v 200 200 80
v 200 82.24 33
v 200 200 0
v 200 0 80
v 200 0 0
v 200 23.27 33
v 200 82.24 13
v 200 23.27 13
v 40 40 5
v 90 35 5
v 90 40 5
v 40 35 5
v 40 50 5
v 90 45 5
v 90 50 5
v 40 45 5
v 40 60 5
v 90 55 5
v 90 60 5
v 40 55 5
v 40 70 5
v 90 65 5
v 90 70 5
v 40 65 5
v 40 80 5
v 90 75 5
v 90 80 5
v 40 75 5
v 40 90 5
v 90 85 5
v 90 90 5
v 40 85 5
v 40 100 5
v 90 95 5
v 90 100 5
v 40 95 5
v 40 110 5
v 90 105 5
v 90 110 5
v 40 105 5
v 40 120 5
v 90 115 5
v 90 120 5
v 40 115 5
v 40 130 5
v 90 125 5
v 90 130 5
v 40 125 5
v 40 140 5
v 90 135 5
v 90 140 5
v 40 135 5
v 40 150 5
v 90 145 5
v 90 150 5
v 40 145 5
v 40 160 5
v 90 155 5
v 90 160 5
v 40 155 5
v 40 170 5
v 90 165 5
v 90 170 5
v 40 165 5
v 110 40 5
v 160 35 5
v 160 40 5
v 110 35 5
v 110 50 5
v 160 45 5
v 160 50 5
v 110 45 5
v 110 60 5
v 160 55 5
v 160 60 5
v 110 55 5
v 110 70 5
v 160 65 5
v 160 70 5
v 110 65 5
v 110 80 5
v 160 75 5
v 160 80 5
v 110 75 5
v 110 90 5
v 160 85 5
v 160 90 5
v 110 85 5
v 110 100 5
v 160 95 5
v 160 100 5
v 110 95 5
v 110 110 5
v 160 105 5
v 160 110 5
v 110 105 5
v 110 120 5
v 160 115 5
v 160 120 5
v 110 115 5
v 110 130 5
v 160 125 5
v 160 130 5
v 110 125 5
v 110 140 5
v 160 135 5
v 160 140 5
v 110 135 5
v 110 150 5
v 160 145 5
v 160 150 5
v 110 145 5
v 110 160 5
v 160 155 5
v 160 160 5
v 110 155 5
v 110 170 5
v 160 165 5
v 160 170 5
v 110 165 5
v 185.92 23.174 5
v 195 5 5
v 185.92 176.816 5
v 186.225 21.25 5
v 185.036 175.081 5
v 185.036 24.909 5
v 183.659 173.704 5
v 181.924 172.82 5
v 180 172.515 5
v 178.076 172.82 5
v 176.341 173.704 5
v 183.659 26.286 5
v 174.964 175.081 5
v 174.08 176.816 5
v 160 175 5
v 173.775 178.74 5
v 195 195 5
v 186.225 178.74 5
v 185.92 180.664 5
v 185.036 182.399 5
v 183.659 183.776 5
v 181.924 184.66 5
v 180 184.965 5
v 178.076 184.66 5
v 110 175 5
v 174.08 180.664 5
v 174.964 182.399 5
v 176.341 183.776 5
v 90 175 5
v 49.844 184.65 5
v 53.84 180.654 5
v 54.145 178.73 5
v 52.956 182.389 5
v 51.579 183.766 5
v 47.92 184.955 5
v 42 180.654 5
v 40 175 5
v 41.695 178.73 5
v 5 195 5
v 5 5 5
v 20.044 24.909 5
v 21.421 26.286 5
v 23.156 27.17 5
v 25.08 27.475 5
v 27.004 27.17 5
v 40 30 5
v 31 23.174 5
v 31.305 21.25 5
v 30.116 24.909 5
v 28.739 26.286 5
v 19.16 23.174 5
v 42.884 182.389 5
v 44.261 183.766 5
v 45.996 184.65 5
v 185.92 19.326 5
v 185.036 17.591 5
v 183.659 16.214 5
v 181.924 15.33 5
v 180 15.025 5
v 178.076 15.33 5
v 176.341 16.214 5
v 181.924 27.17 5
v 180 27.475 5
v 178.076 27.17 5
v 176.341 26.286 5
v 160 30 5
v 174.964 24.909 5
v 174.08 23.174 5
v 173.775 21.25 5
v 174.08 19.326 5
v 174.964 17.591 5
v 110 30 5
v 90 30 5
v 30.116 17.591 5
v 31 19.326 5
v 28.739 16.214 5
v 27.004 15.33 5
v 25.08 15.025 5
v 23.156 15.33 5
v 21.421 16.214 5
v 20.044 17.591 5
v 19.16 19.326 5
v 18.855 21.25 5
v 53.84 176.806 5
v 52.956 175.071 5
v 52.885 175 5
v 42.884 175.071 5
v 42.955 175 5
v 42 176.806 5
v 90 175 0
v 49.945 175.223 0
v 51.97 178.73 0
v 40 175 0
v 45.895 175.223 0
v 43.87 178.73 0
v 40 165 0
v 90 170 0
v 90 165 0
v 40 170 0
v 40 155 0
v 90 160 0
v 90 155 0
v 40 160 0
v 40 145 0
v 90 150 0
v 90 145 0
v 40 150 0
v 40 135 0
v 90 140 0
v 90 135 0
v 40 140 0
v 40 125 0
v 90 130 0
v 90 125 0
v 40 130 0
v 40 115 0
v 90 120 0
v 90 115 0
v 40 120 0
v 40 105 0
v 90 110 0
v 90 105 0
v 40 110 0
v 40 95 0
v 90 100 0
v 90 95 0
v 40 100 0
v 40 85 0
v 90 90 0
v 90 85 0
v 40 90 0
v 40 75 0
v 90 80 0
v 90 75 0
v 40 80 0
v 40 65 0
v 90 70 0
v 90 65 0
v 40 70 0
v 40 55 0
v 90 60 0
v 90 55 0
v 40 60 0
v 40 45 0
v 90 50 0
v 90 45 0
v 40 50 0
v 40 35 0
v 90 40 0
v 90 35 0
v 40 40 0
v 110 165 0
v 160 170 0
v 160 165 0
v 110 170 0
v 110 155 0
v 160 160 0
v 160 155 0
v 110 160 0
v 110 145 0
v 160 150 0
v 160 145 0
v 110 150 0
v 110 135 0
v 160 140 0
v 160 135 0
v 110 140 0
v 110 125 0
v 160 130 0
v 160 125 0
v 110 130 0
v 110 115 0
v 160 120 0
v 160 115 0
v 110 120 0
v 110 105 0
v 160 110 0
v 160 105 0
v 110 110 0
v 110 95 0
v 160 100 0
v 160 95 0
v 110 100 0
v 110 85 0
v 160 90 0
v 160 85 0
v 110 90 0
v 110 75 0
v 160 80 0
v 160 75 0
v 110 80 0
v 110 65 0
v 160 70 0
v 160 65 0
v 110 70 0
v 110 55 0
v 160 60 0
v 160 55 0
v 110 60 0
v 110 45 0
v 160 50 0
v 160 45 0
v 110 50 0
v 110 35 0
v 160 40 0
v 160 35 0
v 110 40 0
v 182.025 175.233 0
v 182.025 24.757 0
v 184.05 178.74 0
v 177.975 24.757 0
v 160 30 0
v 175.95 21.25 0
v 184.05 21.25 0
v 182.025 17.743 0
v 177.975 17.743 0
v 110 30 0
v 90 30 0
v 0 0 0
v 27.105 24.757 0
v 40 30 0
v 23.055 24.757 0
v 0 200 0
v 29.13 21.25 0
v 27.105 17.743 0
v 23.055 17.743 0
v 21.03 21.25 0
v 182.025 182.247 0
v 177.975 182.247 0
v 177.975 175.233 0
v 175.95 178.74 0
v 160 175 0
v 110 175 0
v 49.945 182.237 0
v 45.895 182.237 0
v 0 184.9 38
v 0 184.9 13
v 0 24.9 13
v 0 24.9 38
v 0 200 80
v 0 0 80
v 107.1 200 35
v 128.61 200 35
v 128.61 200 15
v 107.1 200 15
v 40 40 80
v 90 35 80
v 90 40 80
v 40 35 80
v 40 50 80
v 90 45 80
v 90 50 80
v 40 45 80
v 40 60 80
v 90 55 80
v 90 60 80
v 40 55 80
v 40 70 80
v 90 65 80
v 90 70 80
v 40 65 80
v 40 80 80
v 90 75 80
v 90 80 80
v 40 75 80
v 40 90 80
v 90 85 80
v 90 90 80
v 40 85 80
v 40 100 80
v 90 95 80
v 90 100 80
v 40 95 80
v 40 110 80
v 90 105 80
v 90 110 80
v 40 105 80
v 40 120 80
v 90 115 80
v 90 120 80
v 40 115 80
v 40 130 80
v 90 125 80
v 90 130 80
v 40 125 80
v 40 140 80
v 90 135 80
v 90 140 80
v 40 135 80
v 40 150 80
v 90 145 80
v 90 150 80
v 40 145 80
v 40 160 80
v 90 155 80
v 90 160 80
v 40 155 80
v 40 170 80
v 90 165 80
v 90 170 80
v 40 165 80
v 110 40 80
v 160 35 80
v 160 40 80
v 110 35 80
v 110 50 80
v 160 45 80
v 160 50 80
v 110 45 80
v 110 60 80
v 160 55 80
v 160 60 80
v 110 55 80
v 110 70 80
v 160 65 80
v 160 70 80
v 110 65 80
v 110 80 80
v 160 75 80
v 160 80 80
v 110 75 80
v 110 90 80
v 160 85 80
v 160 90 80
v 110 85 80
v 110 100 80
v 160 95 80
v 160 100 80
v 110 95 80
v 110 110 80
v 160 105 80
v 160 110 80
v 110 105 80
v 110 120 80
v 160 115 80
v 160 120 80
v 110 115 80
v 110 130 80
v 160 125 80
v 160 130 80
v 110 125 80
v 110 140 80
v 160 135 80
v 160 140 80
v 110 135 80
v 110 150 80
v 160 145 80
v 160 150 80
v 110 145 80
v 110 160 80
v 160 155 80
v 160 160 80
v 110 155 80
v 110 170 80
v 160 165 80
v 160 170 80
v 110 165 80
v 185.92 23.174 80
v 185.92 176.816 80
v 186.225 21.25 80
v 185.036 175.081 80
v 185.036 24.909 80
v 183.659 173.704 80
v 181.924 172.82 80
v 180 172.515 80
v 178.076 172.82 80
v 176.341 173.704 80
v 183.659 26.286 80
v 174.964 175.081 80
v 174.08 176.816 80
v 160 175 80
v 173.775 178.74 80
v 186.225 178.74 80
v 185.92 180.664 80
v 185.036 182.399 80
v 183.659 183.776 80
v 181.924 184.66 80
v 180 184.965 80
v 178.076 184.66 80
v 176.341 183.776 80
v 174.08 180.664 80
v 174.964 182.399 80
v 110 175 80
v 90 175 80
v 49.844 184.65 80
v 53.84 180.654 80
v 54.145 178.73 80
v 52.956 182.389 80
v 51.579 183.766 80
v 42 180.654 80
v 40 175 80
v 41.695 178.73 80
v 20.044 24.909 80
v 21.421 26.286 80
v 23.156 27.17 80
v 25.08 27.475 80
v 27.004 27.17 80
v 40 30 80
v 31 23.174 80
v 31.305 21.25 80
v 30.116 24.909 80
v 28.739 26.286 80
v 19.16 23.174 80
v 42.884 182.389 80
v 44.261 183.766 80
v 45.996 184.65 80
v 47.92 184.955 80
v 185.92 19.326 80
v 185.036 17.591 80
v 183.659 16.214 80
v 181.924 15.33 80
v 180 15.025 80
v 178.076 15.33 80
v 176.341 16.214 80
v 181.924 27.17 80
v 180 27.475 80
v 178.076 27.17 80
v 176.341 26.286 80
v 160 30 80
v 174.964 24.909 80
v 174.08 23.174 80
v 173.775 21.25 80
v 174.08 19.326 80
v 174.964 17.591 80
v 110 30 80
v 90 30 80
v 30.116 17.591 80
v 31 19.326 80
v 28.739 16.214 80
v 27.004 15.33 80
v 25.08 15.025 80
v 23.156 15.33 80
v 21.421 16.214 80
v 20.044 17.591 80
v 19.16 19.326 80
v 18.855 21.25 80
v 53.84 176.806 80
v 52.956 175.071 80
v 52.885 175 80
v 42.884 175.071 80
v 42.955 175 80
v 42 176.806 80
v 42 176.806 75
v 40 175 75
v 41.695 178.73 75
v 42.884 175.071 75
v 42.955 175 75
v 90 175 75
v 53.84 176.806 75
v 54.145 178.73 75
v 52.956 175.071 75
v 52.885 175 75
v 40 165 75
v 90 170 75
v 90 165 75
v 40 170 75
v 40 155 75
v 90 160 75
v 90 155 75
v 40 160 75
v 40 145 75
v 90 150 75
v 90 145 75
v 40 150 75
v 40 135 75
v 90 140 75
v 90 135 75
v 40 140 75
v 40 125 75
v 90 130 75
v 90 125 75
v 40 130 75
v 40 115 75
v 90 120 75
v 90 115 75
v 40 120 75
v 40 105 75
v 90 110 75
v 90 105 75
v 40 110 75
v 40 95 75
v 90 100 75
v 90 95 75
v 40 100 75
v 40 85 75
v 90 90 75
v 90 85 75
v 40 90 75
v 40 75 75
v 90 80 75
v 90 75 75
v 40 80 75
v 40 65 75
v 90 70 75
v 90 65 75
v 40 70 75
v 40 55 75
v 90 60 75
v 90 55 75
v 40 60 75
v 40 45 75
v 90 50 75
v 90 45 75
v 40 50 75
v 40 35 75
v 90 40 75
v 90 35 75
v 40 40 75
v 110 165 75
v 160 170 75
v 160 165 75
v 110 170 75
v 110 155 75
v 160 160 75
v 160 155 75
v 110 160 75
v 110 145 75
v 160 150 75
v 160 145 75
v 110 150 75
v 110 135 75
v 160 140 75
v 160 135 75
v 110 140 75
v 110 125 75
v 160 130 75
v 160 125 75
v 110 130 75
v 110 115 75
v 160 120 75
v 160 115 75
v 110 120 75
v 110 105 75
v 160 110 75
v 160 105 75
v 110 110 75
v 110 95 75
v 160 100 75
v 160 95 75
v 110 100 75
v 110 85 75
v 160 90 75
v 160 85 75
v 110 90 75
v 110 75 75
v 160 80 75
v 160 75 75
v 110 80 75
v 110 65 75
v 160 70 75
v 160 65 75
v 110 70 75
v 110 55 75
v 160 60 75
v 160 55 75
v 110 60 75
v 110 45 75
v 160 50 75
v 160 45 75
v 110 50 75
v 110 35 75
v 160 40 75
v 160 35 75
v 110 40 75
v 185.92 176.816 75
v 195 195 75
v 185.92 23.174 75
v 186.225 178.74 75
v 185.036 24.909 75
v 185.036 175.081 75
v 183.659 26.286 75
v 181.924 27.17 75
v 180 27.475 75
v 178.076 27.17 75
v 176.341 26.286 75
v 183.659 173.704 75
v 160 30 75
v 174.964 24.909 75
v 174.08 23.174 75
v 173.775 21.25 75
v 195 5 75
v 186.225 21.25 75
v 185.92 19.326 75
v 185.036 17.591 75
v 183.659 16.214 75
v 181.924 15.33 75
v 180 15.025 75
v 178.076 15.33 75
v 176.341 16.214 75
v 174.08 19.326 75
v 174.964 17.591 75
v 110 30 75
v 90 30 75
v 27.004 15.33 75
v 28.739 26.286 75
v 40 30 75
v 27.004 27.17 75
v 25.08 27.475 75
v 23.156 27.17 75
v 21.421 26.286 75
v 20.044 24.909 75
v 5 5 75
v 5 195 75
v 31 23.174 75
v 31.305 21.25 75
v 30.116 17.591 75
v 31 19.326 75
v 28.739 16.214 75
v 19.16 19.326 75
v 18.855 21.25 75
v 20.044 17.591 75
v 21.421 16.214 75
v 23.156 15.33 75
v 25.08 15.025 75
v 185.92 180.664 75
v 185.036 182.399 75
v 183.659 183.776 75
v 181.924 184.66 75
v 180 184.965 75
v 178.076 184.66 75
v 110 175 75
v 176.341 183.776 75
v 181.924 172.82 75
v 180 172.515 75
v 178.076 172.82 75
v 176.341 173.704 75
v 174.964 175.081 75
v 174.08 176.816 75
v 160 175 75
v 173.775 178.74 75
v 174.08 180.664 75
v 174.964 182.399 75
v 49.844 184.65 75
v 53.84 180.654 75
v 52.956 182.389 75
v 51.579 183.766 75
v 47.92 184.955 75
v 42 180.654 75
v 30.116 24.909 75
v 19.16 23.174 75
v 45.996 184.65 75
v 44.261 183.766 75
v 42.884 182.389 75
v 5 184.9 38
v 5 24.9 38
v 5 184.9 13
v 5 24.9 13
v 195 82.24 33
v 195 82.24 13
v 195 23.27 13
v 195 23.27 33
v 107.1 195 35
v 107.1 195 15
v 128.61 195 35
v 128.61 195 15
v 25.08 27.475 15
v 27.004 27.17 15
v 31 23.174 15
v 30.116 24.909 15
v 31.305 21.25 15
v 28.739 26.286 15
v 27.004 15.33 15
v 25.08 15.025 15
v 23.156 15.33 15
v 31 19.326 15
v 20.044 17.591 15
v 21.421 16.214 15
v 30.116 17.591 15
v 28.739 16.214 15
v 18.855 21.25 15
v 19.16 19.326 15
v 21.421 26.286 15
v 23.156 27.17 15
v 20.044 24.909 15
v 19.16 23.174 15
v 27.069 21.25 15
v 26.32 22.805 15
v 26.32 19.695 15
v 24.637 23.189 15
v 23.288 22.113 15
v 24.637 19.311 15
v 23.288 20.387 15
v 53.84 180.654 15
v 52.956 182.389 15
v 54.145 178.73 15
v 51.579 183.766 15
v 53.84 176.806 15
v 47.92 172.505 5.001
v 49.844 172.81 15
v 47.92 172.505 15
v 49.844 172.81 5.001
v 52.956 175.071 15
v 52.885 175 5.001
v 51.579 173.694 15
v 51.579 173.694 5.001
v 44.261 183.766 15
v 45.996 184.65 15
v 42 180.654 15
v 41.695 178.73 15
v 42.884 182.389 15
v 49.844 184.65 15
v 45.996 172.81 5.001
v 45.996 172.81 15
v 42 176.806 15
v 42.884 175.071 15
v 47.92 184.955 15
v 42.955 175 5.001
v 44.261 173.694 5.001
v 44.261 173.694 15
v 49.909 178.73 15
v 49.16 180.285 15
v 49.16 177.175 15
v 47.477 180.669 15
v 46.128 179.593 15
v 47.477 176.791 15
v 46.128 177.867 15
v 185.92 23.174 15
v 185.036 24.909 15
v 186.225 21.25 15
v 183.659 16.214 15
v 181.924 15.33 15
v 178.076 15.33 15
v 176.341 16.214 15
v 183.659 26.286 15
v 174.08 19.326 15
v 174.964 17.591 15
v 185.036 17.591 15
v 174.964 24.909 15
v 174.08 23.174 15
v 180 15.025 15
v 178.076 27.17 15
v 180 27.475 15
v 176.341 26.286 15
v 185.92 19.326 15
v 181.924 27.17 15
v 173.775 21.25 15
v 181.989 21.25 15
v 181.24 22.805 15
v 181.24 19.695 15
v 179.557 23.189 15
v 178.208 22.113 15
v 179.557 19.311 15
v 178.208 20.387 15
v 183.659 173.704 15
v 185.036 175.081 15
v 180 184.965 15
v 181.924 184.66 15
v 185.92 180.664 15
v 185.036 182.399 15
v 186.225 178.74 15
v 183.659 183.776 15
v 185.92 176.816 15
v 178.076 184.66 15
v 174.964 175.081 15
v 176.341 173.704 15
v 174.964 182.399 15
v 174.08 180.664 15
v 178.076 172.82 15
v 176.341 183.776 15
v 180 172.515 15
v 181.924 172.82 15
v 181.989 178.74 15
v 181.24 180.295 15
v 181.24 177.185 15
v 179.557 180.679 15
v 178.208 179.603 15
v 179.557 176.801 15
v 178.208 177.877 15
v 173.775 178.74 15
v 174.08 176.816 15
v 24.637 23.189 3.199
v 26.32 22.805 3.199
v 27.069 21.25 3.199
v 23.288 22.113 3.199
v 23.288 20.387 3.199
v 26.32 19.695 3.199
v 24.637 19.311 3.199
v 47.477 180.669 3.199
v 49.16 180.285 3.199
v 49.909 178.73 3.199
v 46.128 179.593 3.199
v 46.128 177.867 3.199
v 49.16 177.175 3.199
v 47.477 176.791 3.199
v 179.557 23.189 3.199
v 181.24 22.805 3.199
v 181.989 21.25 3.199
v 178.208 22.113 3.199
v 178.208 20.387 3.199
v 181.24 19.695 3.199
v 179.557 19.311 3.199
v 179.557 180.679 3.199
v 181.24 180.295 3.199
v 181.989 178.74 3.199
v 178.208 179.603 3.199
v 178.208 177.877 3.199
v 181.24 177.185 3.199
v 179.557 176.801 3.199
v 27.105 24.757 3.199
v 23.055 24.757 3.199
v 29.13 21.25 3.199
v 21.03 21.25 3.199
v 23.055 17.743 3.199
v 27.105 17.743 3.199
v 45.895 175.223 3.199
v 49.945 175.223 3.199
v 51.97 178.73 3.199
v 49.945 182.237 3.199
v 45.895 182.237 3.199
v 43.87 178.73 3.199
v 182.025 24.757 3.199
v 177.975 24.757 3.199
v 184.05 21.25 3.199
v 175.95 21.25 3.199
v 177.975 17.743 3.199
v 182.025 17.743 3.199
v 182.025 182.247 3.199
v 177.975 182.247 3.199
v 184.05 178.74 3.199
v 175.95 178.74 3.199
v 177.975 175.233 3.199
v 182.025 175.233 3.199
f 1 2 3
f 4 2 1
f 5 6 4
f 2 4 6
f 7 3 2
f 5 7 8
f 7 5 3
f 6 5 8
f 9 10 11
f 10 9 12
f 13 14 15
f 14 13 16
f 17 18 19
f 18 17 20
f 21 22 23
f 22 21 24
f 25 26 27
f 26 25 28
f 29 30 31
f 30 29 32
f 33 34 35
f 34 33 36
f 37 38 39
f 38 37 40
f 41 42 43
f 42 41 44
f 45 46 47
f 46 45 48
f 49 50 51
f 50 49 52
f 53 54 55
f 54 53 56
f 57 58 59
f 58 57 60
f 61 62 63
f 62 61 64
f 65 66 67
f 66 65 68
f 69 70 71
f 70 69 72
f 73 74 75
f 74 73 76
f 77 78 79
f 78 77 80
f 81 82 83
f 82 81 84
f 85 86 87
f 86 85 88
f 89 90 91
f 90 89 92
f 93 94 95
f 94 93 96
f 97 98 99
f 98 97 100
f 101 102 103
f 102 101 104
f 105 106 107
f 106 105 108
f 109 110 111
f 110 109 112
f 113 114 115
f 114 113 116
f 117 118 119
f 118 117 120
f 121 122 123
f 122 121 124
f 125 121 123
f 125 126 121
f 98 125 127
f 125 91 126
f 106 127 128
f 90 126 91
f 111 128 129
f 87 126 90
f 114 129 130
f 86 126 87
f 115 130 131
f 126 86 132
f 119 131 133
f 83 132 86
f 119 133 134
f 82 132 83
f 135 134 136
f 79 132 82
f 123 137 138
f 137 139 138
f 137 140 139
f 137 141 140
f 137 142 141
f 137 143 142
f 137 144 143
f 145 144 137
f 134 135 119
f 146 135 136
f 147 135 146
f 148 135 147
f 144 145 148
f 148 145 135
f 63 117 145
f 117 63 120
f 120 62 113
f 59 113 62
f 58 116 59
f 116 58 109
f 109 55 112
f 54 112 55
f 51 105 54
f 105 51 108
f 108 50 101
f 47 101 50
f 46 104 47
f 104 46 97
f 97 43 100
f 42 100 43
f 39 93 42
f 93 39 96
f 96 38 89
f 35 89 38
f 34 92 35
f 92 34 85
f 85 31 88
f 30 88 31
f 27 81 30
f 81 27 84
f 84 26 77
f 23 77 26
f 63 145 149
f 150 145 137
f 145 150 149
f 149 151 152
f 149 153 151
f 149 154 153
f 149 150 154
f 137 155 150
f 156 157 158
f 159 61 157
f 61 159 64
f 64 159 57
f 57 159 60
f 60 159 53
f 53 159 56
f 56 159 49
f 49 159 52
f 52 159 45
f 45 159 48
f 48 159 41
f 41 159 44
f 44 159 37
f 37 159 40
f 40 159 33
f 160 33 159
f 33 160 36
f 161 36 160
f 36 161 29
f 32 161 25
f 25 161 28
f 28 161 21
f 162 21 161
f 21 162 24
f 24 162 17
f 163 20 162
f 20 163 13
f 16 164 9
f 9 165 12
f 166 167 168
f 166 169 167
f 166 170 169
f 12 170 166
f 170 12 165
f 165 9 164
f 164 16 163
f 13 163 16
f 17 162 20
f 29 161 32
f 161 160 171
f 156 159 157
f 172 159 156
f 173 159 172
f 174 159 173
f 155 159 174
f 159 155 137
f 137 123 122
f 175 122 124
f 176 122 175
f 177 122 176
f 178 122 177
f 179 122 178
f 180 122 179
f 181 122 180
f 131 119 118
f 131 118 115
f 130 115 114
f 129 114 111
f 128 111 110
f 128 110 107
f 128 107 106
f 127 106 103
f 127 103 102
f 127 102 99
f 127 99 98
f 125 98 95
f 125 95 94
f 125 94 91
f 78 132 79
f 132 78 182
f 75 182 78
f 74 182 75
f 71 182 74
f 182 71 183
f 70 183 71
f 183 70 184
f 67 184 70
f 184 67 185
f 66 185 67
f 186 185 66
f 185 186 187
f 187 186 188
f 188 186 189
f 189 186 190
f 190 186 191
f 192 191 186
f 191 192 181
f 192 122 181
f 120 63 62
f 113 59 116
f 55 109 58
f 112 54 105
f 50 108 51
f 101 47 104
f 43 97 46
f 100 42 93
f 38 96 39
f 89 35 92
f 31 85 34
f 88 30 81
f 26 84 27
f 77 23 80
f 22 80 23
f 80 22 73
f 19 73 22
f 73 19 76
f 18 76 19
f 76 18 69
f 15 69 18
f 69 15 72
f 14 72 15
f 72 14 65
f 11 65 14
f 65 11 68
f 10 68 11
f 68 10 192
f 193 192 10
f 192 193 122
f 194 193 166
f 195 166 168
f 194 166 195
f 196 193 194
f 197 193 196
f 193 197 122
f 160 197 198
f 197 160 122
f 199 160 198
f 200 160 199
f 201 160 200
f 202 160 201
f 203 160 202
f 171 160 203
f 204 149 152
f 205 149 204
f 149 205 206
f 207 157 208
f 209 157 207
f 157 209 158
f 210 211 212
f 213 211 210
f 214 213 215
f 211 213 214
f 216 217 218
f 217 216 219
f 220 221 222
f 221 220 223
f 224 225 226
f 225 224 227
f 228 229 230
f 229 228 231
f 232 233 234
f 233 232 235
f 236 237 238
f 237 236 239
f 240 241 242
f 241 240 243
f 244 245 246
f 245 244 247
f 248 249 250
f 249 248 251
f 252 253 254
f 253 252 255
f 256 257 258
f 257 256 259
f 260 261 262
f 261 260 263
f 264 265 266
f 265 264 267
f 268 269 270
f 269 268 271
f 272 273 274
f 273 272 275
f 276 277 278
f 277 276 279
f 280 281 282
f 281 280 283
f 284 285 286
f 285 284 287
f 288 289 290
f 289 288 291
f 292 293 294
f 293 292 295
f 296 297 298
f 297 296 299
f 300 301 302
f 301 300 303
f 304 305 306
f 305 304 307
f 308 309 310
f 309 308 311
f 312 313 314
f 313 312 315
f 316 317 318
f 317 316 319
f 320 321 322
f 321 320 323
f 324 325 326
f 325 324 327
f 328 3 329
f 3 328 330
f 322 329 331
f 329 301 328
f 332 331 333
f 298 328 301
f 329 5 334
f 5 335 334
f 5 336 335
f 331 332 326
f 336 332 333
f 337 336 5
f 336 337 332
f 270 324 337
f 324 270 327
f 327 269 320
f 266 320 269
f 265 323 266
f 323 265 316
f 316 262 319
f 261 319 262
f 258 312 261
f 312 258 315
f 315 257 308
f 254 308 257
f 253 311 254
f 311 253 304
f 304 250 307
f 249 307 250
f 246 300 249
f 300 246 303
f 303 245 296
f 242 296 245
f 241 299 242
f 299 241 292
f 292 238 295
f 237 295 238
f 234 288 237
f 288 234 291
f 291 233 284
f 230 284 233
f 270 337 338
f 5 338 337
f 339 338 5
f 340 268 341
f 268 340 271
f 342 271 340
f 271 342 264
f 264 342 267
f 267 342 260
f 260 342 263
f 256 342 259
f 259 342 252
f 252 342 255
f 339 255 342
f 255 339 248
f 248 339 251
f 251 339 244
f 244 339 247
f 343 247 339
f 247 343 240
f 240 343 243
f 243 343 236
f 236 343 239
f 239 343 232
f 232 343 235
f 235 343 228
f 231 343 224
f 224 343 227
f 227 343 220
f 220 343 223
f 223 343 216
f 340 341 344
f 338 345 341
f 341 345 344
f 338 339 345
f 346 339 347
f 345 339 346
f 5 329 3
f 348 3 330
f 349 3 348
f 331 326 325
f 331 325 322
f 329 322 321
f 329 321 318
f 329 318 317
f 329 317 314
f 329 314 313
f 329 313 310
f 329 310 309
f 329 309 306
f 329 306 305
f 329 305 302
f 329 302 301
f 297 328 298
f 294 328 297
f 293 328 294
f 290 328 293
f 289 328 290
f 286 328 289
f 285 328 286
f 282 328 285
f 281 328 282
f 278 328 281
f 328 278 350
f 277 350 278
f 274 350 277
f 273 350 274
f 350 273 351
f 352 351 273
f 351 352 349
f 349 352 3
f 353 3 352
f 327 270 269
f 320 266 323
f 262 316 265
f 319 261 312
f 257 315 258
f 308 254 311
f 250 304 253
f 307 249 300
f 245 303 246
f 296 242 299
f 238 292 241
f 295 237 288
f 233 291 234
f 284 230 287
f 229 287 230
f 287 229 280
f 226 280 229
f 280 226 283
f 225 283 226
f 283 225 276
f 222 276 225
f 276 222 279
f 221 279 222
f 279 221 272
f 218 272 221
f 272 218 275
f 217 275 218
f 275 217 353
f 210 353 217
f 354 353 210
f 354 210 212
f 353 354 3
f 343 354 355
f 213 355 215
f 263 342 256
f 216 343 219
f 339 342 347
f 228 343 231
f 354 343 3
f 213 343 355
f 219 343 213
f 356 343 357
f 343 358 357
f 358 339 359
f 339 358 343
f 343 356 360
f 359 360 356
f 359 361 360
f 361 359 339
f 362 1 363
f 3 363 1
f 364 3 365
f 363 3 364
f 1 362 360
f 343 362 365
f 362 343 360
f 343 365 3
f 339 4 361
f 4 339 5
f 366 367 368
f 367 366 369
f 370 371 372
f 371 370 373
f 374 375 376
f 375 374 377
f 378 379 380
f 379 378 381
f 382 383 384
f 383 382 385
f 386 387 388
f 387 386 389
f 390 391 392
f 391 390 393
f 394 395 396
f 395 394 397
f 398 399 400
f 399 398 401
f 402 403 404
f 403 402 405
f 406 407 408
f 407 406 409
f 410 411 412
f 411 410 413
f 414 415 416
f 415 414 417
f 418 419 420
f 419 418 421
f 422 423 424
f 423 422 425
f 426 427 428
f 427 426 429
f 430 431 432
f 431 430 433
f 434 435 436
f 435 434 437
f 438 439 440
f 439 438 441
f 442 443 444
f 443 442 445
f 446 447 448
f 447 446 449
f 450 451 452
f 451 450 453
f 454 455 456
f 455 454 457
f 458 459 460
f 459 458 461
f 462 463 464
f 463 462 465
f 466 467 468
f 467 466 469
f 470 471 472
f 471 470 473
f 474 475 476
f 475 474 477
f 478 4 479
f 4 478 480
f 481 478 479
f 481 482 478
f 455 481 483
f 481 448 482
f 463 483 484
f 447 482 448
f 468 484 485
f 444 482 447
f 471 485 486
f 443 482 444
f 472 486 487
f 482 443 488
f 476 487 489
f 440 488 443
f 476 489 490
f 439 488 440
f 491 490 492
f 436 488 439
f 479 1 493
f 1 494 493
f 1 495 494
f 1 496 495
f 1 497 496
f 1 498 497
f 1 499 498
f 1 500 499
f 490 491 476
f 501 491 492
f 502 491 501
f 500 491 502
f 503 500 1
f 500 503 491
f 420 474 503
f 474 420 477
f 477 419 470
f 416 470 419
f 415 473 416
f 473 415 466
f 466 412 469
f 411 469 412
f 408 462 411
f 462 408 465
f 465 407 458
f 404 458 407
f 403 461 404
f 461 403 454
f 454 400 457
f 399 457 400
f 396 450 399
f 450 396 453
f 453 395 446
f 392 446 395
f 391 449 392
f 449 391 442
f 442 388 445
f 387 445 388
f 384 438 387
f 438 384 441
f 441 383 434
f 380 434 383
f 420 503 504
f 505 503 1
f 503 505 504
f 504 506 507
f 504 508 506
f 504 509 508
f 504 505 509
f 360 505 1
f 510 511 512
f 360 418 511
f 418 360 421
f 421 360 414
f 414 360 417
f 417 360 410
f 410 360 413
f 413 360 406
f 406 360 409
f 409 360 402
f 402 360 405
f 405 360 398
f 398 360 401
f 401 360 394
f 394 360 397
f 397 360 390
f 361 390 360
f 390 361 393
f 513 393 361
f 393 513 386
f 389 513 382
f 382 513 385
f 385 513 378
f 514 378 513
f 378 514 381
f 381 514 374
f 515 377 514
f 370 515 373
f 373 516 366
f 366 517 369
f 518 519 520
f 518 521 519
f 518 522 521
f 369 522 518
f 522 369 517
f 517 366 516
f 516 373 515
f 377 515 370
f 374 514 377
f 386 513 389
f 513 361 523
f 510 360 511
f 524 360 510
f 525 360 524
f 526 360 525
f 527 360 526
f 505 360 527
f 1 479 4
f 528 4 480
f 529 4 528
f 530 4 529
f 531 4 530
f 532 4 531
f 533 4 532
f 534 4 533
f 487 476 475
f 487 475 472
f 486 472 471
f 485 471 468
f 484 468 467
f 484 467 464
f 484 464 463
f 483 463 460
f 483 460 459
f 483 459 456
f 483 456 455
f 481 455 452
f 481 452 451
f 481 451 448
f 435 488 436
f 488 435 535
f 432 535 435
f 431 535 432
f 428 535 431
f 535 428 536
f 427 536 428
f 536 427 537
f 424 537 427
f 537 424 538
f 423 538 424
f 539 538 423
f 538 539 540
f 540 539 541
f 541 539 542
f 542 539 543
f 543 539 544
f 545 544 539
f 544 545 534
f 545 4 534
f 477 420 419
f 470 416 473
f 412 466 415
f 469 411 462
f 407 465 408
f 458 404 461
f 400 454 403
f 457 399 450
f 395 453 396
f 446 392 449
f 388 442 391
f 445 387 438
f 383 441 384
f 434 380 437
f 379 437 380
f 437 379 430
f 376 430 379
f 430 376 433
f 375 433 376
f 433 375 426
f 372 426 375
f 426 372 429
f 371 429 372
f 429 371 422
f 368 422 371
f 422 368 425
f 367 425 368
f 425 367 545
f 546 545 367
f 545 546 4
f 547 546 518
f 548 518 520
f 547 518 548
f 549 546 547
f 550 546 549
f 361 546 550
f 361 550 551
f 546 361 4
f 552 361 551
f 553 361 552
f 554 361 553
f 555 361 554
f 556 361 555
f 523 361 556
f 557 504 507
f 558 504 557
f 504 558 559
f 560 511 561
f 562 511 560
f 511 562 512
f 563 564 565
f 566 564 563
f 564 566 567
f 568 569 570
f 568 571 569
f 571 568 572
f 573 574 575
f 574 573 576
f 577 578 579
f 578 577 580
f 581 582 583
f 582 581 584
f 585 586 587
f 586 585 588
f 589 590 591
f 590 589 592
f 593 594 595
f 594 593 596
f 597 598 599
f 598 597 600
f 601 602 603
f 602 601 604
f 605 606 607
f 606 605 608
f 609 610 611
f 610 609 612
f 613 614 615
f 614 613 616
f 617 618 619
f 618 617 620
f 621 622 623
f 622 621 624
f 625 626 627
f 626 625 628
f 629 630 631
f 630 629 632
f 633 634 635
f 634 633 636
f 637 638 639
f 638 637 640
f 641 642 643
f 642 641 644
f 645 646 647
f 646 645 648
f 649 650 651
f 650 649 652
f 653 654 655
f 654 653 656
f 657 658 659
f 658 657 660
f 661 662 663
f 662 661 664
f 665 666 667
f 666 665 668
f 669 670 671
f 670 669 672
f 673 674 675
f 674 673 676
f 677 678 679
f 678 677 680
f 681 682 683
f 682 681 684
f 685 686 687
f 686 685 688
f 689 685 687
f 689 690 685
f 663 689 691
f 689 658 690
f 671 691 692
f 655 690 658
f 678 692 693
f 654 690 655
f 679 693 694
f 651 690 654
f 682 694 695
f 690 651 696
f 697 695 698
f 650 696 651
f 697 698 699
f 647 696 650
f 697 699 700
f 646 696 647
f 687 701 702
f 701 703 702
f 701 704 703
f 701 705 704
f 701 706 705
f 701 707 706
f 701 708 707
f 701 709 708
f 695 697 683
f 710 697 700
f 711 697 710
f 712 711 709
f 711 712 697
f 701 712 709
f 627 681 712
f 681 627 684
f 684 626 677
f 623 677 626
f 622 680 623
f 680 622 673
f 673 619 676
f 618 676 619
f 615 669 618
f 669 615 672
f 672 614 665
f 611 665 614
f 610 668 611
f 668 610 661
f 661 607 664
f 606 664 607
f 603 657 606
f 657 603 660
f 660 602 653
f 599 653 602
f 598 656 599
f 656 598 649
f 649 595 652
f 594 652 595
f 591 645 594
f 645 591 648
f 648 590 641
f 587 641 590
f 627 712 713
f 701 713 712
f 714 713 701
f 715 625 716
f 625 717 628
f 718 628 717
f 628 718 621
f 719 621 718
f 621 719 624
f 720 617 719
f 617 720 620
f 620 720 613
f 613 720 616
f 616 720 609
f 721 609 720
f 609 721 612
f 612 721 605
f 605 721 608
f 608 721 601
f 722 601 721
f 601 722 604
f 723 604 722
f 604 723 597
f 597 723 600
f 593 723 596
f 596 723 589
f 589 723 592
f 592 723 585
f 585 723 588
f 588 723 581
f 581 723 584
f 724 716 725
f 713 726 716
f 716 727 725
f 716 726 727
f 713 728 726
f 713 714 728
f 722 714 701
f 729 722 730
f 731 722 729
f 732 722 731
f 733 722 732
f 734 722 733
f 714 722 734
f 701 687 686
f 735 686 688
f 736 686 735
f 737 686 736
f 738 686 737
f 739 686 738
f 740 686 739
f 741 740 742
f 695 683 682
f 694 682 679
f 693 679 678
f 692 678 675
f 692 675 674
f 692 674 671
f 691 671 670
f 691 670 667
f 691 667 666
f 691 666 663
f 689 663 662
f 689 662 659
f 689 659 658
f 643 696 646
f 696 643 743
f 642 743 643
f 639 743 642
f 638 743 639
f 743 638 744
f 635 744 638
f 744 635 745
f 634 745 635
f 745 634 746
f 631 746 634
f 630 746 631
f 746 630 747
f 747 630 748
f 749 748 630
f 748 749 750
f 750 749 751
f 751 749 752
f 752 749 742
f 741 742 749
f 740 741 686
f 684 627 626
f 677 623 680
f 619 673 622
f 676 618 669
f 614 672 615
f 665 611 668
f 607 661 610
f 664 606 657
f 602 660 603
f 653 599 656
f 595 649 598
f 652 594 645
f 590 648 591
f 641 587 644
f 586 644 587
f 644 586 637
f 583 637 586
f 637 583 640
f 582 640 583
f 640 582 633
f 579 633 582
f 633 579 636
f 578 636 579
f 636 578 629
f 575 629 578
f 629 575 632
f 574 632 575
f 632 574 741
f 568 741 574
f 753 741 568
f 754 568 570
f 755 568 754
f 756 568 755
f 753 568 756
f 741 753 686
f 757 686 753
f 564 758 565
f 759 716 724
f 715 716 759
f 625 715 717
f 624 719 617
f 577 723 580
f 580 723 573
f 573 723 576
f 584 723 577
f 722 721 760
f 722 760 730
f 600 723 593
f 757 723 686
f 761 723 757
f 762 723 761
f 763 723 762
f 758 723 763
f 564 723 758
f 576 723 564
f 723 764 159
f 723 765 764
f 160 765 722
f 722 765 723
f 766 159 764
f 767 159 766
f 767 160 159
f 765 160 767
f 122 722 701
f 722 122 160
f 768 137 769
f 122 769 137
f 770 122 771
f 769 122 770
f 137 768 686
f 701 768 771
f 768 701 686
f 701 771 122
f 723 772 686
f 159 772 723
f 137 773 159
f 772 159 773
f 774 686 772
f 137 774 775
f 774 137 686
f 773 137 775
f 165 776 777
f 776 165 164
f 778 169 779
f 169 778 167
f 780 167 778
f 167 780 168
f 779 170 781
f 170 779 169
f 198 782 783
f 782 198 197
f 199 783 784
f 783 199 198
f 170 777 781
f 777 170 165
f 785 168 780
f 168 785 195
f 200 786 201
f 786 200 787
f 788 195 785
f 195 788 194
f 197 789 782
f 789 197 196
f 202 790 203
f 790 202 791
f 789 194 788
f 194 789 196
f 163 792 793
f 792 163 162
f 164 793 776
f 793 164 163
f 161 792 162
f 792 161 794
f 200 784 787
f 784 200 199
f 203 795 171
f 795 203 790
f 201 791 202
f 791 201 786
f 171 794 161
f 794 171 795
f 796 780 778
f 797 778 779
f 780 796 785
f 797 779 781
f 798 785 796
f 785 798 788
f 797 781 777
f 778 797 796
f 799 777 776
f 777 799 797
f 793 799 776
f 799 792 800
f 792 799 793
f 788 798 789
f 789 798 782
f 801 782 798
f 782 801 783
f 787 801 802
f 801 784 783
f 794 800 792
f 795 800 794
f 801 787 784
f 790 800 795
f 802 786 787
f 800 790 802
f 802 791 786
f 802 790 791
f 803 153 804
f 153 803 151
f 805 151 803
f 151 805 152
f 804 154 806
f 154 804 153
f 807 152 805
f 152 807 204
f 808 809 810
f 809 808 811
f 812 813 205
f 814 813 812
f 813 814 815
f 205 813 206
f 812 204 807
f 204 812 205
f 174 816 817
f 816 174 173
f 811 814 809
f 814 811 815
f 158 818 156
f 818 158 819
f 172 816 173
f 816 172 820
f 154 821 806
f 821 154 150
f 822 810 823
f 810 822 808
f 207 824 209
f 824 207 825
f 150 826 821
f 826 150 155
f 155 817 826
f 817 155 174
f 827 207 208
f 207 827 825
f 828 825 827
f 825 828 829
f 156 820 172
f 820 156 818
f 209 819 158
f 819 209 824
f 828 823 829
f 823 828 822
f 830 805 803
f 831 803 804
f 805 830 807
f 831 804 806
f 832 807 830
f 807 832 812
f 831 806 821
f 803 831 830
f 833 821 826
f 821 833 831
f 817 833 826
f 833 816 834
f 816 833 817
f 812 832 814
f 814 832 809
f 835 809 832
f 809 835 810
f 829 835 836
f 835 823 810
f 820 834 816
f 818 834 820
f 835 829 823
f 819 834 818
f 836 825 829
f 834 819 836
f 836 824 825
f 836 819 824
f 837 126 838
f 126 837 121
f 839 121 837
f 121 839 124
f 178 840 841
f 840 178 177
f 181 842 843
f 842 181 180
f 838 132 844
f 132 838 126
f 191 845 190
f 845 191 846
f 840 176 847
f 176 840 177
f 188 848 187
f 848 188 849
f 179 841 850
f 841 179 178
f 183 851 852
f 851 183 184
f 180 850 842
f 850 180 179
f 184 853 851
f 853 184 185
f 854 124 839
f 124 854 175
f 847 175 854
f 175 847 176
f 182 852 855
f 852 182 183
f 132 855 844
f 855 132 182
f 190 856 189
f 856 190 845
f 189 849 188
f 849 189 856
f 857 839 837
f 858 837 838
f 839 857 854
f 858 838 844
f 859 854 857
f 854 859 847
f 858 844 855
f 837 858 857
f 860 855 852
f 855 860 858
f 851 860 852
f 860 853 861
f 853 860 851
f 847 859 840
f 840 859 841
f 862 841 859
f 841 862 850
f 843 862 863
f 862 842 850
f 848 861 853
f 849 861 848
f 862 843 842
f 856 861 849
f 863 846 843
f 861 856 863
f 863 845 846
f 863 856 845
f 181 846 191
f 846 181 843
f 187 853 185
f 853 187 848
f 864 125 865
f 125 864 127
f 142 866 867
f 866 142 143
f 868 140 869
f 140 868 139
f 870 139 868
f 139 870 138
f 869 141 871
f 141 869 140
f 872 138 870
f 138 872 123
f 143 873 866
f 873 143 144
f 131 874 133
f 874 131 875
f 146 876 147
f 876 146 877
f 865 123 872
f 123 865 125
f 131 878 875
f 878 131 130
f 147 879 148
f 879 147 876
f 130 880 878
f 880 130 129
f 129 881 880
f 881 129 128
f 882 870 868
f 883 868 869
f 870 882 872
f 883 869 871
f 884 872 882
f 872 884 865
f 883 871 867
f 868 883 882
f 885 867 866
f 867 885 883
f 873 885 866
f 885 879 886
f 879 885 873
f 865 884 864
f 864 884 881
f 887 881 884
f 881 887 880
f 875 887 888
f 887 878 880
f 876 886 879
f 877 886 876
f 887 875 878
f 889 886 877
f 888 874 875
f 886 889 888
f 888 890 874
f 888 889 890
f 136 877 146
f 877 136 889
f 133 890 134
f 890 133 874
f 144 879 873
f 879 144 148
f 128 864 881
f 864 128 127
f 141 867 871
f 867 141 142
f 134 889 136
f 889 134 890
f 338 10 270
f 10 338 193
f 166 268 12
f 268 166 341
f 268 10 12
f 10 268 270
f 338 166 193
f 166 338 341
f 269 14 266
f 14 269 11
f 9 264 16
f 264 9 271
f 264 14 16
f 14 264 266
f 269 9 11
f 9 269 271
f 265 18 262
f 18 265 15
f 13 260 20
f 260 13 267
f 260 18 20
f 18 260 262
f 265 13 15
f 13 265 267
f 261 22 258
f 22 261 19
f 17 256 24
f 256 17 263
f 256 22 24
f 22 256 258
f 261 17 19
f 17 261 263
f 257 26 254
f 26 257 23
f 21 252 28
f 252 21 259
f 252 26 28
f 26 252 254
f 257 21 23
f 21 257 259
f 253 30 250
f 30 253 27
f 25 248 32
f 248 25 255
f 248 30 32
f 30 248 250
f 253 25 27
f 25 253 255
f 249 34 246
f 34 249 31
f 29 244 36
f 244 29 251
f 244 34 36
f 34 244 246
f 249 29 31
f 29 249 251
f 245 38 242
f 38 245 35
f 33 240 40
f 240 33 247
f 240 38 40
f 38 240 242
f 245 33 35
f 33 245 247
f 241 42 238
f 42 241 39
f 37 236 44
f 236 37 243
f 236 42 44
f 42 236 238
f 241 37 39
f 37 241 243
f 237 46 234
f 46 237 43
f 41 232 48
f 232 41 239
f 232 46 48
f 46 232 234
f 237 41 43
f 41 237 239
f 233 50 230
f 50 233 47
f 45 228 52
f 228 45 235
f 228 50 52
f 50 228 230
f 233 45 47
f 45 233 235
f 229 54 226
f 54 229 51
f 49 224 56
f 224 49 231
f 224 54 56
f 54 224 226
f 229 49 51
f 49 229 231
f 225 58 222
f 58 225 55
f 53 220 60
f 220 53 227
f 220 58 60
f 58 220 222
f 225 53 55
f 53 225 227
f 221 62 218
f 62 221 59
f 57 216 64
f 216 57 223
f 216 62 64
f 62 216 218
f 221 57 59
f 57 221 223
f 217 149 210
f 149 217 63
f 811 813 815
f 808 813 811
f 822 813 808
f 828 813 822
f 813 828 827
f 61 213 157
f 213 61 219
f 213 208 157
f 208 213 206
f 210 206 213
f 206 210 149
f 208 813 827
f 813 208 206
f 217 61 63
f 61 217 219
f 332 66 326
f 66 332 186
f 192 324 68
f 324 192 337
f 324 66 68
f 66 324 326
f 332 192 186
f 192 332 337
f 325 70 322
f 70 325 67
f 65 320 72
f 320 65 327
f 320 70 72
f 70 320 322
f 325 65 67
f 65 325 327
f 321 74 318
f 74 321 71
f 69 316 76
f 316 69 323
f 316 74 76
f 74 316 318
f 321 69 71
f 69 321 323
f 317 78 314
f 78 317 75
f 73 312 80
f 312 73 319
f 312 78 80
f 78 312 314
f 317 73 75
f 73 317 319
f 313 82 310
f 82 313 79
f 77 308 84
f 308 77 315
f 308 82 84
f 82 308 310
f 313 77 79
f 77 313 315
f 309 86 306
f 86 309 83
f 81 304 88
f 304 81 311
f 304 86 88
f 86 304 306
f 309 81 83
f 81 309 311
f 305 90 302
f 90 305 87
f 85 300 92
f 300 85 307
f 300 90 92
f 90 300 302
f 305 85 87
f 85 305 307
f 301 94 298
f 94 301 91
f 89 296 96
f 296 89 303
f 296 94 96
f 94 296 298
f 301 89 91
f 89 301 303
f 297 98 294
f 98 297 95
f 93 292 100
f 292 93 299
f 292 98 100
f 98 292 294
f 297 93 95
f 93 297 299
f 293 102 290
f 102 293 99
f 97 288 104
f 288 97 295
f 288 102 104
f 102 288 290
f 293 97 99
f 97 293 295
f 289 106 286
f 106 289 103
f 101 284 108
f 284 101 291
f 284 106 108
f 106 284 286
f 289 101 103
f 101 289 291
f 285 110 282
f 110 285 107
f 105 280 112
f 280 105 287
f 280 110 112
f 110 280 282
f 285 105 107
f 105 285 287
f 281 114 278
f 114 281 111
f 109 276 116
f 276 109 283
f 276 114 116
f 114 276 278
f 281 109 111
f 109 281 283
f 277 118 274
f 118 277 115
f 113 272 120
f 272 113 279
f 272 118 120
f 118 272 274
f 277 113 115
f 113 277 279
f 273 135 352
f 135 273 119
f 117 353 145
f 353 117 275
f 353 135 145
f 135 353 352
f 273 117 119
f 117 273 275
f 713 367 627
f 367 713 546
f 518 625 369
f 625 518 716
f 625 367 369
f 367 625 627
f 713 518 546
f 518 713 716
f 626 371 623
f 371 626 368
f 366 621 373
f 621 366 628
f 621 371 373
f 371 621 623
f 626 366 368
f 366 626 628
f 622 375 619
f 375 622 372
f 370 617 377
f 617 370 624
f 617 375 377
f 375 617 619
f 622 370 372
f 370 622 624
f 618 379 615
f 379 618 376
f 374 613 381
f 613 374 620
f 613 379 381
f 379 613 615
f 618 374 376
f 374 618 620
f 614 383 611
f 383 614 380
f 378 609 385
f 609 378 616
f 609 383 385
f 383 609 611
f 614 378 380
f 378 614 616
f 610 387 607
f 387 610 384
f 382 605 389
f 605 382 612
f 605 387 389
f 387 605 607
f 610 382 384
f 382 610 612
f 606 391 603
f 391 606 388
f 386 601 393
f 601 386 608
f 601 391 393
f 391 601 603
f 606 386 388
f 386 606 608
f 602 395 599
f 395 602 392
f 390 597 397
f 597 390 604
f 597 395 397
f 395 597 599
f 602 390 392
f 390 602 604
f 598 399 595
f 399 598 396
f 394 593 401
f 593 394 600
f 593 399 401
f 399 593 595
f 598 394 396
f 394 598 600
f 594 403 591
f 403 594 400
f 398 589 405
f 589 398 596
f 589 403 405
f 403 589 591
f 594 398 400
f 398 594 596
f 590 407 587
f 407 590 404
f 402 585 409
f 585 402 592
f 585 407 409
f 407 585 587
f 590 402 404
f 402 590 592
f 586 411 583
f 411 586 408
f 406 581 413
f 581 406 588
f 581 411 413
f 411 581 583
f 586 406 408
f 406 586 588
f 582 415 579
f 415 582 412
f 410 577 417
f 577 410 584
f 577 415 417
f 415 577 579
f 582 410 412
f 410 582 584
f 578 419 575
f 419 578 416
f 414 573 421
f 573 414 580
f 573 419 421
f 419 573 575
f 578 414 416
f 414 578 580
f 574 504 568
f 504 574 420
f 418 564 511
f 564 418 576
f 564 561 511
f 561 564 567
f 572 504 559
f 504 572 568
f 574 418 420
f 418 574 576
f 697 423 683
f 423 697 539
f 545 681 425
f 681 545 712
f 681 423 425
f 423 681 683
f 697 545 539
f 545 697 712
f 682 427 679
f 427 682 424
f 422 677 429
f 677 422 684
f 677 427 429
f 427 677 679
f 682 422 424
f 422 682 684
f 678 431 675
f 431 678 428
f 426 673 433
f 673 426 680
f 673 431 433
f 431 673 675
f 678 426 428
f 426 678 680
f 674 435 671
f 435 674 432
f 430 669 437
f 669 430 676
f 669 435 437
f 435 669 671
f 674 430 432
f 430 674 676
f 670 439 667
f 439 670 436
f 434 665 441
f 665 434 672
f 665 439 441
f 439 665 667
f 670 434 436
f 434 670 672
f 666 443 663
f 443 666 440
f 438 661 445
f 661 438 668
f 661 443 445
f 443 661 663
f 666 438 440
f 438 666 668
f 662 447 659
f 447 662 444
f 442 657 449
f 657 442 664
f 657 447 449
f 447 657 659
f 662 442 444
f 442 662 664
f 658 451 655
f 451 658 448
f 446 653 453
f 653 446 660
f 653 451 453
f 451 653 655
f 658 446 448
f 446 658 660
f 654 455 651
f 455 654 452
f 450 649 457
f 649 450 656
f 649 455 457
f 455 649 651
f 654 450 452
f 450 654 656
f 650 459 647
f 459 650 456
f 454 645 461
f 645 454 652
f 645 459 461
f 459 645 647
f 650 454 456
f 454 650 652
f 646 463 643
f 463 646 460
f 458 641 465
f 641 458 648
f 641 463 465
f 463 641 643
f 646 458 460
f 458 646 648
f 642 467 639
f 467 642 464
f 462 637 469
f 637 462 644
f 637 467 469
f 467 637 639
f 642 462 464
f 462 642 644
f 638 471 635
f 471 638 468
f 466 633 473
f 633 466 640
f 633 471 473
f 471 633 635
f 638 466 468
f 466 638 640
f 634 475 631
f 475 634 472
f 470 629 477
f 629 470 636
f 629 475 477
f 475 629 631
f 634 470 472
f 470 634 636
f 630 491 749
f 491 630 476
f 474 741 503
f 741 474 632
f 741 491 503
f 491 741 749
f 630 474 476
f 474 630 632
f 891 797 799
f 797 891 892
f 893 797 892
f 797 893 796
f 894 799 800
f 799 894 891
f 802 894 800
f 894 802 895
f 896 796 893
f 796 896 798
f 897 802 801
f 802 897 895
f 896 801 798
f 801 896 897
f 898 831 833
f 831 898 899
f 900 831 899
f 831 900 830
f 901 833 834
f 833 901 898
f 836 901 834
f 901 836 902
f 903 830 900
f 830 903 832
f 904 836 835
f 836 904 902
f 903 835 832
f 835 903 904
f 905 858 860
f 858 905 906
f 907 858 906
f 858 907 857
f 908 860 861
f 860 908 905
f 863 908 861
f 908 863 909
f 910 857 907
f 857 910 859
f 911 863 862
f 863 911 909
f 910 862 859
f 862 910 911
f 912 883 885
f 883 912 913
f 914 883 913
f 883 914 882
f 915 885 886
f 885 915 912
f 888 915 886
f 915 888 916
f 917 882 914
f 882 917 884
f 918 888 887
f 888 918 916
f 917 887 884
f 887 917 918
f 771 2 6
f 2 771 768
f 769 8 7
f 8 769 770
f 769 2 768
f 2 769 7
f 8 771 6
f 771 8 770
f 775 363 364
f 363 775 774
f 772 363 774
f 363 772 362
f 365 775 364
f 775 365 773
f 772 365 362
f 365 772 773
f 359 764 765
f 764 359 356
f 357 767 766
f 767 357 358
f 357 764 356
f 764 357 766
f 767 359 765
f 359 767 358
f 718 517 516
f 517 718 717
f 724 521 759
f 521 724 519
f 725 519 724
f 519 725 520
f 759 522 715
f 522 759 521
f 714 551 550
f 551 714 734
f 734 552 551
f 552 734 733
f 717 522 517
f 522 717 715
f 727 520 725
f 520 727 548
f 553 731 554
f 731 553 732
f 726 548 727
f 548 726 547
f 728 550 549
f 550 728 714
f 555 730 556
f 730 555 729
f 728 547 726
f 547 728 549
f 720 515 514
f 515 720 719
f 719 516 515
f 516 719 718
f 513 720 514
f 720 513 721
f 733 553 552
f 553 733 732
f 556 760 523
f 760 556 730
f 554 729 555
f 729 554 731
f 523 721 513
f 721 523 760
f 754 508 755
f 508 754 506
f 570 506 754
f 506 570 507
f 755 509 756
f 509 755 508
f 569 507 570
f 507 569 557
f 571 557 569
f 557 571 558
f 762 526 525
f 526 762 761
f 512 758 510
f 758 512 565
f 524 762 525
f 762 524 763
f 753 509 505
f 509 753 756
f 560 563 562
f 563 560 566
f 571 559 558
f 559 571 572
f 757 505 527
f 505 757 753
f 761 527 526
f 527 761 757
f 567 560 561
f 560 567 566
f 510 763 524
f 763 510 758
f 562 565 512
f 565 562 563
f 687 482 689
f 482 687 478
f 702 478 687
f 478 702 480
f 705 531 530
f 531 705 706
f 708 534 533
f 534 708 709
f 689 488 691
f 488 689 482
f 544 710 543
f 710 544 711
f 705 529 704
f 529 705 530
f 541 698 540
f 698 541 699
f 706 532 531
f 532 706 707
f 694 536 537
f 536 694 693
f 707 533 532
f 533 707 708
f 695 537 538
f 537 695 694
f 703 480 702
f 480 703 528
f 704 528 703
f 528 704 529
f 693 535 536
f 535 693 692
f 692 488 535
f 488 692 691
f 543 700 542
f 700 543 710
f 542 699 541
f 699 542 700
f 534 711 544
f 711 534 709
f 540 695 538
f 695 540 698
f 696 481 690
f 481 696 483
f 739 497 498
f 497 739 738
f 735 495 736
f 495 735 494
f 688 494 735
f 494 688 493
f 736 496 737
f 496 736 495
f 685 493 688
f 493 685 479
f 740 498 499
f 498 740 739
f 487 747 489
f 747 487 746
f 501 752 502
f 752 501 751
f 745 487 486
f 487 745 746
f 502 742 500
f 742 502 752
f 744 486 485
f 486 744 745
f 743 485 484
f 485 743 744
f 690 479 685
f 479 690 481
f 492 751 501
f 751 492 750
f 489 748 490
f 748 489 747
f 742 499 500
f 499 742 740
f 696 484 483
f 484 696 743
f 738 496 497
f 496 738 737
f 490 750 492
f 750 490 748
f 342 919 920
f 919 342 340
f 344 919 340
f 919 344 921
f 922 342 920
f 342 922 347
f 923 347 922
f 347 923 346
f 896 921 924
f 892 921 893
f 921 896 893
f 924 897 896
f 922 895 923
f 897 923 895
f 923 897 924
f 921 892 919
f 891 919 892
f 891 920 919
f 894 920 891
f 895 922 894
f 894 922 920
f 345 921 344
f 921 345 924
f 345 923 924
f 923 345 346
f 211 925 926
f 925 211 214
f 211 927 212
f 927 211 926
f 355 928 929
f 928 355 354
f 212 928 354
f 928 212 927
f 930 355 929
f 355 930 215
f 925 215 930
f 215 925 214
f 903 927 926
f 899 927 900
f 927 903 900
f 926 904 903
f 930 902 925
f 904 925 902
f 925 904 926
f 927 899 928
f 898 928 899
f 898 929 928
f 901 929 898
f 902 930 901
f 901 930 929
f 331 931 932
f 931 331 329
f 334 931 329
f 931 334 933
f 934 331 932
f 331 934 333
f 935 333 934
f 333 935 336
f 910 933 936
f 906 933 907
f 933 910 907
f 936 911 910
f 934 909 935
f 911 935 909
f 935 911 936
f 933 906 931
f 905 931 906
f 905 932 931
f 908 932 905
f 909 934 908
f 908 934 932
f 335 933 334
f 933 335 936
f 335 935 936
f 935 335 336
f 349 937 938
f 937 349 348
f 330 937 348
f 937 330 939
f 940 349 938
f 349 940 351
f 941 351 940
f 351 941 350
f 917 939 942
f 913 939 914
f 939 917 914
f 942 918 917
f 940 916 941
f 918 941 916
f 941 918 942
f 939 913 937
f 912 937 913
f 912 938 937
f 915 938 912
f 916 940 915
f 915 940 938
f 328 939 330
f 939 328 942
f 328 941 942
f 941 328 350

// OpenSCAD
// Variables 
// in mm
include <MCAD/nuts_and_bolts.scad>;

// Internal dimensions
internalX=190; // or 180
internalY=190; // or 180
internalZ=70;
// How thick all walls are
wallThickness=5; // or 3
// External dimensions
externalX=internalX+(wallThickness*2);
echo("ExternalX: ",externalX);
externalY=internalY+(wallThickness*2);
echo("ExternalY: ",externalY);
externalZ=internalZ+(wallThickness*2);
echo("ExternalZ: ",externalZ);
// Board dimensions
boardX=170.2;
boardY=170.2;
boardZ=15.58;
boardZCPU=40;
// Hight of the screw holes / Space between bottom of 
// pcb and interiour bottom of case
screwHeight=10;
// Space between board and interrior wall
bufferX=(internalX-boardX)/2;
bufferY=(internalY-boardY)/2;
// PCB Starting points
boardStartX=wallThickness+bufferX;
boardStartY=wallThickness+bufferY;
// Z height of the bottom of the PCB
pcbBottomZ=wallThickness+screwHeight;
// Z height of where the top-of-pcb plug holes should start
plugHolesStartZ=pcbBottomZ-2;
// Z height of where the CPU parts end (except for CPU)
componentTopZ=pcbBottomZ+boardZ;
// Z height of where the CPU heatsink ends
CPUTopZ=pcbBottomZ+boardZCPU;
// Screw hole outer radius
screwHoleOuterRadius=6.45/2+3;

// Buttons
buttonOuterWidth=44.97;
buttonExtra=7;
buttonHoleY=buttonOuterWidth+(buttonExtra*2);
buttonHoleZ=20;

// Camera
cameraWidth=21.51;
cameraHeight=25-5;
cameraStartX=boardStartX+92.2;
cameraStartZ=pcbBottomZ;

// Main I/O
ioMainStartY=boardStartY+10;
ioMainStartZ=plugHolesStartZ;
ioMainWidth=160;
ioMainHeight=25;

// Top & Bottom vents
ventLength=50;
ventWidth=5;
ventStartX=40;
ventStartY=30;
ventEndX=boardStartX+boardX-ventLength;
ventEndY=boardStartY+boardY-(ventStartY/2);

difference() {
    union() {
        // bottom
        cube([externalX,externalY,wallThickness]);

        // Top
        translate([0,0,externalZ-wallThickness])
            cube([externalX,externalY,wallThickness]);
        
        // PCB
        *translate([boardStartX,boardStartY,pcbBottomZ])
            cube([boardX,boardY,boardZCPU]);

        // Side
        translate([0,0,0])
            cube([wallThickness,externalY,externalZ-wallThickness]);
        
        // Side
        translate([0,0,0])
            cube([externalX,wallThickness,externalZ-wallThickness]);
        
        // Side 
        translate([externalX-wallThickness,0,0])
            cube([wallThickness,externalY,externalZ-wallThickness]);
        
        // Side 
        translate([0,externalY-wallThickness,0])
            cube([externalX,wallThickness,externalZ-wallThickness]);

        // Screw Hole - Upper left
        translate([boardStartX+10.18,boardStartY+6.35,wallThickness+(screwHeight/2)])
            cylinder(r=screwHoleOuterRadius,h=screwHeight,center=true);
        
        // Screw Hole - Upper Right
        translate([boardStartX+33.02,boardStartY+163.83,wallThickness+(screwHeight/2)])
            cylinder(r=screwHoleOuterRadius,h=screwHeight,center=true);
            
        // Screw Hole - Lower left
        translate([boardStartX+165.10,boardStartY+6.35,wallThickness+(screwHeight/2)])
            cylinder(r=screwHoleOuterRadius,h=screwHeight,center=true);
        
        // Screw Hole - Lower Right
        translate([boardStartX+165.10,boardStartY+163.84,wallThickness+(screwHeight/2)])
            cylinder(r=screwHoleOuterRadius,h=screwHeight,center=true);
    };
    // Stuff to remove from sides/top/bottom
    union() {
        // Buttons at bottom left
        translate([externalX-wallThickness-0.001,boardStartY+15.37-buttonExtra,plugHolesStartZ])
            cube([wallThickness+0.002,buttonHoleY,buttonHoleZ]);
        
        // Camera on right side
        translate([cameraStartX,externalY-wallThickness-0.001,cameraStartZ])
            cube([cameraWidth,wallThickness+0.002,cameraHeight]);
        
        // Main I/O panel on top
        translate([0-0.001,ioMainStartY,ioMainStartZ])
            cube([wallThickness+0.002,ioMainWidth,ioMainHeight]);
    
        // Bottom Slots
        for (x=[ventStartX:ventLength+20:ventEndX]) {    
            for (y=[ventStartY:ventWidth*2:ventEndY]) {      
                translate([x,y,0-0.001])
                    cube([ventLength,ventWidth,wallThickness+0.002]);
            };
        };
        
        // Top Slots
        for (x=[ventStartX:ventLength+20:ventEndX]) {    
            for (y=[ventStartY:ventWidth*2:ventEndY]) {      
                translate([x,y,externalZ-wallThickness-0.001])
                    cube([ventLength,ventWidth,wallThickness+0.002]);
            };
        };
        
         // Screw Hole - Upper left
        translate([boardStartX+10.18,boardStartY+6.35,externalZ-(wallThickness/2)])
            cylinder(r=screwHoleOuterRadius,h=wallThickness+0.002,center=true);
        
        // Screw Hole - Upper Right
        translate([boardStartX+33.02,boardStartY+163.83,externalZ-(wallThickness/2)])
            cylinder(r=screwHoleOuterRadius,h=wallThickness+0.002,center=true);
            
        // Screw Hole - Lower left
        translate([boardStartX+165.10,boardStartY+6.35,externalZ-(wallThickness/2)])
            cylinder(r=screwHoleOuterRadius,h=wallThickness+0.002,center=true);
        
        // Screw Hole - Lower Right
        translate([boardStartX+165.10,boardStartY+163.84,externalZ-(wallThickness/2)])
            cylinder(r=screwHoleOuterRadius,h=screwHeight,center=true);
        
        // Spot for M4 nuts and bolts
        translate([boardStartX+10.18,boardStartY+6.35,-0.001])
            nutHole(4);
        translate([boardStartX+10.18,boardStartY+6.35,-0.001])
            boltHole(4,length=wallThickness+screwHeight+0.002);
            
        translate([boardStartX+33.02,boardStartY+163.83,-0.001])
            nutHole(4);
        translate([boardStartX+33.02,boardStartY+163.83,-0.001])
            boltHole(4,length=wallThickness+screwHeight+0.002);
            
        translate([boardStartX+165.10,boardStartY+6.35,-0.001])
            nutHole(4);
        translate([boardStartX+165.10,boardStartY+6.35,-0.001])
            boltHole(4,length=wallThickness+screwHeight+0.002);        
            
        translate([boardStartX+165.10,boardStartY+163.84,-0.001])
            nutHole(4);
        translate([boardStartX+165.10,boardStartY+163.84,-0.001])
            boltHole(4,length=wallThickness+screwHeight+0.002);
        
        // For Side A
        *translate([externalX/2,-0.001,-0.001])
            cube([externalX/2+5,externalY+5,externalZ+5]);
        
        // For Side B
        *translate([-0,001,-0.001,-0.001])
            cube([externalX/2+5,externalY+5,externalZ+5]);
    };
};
